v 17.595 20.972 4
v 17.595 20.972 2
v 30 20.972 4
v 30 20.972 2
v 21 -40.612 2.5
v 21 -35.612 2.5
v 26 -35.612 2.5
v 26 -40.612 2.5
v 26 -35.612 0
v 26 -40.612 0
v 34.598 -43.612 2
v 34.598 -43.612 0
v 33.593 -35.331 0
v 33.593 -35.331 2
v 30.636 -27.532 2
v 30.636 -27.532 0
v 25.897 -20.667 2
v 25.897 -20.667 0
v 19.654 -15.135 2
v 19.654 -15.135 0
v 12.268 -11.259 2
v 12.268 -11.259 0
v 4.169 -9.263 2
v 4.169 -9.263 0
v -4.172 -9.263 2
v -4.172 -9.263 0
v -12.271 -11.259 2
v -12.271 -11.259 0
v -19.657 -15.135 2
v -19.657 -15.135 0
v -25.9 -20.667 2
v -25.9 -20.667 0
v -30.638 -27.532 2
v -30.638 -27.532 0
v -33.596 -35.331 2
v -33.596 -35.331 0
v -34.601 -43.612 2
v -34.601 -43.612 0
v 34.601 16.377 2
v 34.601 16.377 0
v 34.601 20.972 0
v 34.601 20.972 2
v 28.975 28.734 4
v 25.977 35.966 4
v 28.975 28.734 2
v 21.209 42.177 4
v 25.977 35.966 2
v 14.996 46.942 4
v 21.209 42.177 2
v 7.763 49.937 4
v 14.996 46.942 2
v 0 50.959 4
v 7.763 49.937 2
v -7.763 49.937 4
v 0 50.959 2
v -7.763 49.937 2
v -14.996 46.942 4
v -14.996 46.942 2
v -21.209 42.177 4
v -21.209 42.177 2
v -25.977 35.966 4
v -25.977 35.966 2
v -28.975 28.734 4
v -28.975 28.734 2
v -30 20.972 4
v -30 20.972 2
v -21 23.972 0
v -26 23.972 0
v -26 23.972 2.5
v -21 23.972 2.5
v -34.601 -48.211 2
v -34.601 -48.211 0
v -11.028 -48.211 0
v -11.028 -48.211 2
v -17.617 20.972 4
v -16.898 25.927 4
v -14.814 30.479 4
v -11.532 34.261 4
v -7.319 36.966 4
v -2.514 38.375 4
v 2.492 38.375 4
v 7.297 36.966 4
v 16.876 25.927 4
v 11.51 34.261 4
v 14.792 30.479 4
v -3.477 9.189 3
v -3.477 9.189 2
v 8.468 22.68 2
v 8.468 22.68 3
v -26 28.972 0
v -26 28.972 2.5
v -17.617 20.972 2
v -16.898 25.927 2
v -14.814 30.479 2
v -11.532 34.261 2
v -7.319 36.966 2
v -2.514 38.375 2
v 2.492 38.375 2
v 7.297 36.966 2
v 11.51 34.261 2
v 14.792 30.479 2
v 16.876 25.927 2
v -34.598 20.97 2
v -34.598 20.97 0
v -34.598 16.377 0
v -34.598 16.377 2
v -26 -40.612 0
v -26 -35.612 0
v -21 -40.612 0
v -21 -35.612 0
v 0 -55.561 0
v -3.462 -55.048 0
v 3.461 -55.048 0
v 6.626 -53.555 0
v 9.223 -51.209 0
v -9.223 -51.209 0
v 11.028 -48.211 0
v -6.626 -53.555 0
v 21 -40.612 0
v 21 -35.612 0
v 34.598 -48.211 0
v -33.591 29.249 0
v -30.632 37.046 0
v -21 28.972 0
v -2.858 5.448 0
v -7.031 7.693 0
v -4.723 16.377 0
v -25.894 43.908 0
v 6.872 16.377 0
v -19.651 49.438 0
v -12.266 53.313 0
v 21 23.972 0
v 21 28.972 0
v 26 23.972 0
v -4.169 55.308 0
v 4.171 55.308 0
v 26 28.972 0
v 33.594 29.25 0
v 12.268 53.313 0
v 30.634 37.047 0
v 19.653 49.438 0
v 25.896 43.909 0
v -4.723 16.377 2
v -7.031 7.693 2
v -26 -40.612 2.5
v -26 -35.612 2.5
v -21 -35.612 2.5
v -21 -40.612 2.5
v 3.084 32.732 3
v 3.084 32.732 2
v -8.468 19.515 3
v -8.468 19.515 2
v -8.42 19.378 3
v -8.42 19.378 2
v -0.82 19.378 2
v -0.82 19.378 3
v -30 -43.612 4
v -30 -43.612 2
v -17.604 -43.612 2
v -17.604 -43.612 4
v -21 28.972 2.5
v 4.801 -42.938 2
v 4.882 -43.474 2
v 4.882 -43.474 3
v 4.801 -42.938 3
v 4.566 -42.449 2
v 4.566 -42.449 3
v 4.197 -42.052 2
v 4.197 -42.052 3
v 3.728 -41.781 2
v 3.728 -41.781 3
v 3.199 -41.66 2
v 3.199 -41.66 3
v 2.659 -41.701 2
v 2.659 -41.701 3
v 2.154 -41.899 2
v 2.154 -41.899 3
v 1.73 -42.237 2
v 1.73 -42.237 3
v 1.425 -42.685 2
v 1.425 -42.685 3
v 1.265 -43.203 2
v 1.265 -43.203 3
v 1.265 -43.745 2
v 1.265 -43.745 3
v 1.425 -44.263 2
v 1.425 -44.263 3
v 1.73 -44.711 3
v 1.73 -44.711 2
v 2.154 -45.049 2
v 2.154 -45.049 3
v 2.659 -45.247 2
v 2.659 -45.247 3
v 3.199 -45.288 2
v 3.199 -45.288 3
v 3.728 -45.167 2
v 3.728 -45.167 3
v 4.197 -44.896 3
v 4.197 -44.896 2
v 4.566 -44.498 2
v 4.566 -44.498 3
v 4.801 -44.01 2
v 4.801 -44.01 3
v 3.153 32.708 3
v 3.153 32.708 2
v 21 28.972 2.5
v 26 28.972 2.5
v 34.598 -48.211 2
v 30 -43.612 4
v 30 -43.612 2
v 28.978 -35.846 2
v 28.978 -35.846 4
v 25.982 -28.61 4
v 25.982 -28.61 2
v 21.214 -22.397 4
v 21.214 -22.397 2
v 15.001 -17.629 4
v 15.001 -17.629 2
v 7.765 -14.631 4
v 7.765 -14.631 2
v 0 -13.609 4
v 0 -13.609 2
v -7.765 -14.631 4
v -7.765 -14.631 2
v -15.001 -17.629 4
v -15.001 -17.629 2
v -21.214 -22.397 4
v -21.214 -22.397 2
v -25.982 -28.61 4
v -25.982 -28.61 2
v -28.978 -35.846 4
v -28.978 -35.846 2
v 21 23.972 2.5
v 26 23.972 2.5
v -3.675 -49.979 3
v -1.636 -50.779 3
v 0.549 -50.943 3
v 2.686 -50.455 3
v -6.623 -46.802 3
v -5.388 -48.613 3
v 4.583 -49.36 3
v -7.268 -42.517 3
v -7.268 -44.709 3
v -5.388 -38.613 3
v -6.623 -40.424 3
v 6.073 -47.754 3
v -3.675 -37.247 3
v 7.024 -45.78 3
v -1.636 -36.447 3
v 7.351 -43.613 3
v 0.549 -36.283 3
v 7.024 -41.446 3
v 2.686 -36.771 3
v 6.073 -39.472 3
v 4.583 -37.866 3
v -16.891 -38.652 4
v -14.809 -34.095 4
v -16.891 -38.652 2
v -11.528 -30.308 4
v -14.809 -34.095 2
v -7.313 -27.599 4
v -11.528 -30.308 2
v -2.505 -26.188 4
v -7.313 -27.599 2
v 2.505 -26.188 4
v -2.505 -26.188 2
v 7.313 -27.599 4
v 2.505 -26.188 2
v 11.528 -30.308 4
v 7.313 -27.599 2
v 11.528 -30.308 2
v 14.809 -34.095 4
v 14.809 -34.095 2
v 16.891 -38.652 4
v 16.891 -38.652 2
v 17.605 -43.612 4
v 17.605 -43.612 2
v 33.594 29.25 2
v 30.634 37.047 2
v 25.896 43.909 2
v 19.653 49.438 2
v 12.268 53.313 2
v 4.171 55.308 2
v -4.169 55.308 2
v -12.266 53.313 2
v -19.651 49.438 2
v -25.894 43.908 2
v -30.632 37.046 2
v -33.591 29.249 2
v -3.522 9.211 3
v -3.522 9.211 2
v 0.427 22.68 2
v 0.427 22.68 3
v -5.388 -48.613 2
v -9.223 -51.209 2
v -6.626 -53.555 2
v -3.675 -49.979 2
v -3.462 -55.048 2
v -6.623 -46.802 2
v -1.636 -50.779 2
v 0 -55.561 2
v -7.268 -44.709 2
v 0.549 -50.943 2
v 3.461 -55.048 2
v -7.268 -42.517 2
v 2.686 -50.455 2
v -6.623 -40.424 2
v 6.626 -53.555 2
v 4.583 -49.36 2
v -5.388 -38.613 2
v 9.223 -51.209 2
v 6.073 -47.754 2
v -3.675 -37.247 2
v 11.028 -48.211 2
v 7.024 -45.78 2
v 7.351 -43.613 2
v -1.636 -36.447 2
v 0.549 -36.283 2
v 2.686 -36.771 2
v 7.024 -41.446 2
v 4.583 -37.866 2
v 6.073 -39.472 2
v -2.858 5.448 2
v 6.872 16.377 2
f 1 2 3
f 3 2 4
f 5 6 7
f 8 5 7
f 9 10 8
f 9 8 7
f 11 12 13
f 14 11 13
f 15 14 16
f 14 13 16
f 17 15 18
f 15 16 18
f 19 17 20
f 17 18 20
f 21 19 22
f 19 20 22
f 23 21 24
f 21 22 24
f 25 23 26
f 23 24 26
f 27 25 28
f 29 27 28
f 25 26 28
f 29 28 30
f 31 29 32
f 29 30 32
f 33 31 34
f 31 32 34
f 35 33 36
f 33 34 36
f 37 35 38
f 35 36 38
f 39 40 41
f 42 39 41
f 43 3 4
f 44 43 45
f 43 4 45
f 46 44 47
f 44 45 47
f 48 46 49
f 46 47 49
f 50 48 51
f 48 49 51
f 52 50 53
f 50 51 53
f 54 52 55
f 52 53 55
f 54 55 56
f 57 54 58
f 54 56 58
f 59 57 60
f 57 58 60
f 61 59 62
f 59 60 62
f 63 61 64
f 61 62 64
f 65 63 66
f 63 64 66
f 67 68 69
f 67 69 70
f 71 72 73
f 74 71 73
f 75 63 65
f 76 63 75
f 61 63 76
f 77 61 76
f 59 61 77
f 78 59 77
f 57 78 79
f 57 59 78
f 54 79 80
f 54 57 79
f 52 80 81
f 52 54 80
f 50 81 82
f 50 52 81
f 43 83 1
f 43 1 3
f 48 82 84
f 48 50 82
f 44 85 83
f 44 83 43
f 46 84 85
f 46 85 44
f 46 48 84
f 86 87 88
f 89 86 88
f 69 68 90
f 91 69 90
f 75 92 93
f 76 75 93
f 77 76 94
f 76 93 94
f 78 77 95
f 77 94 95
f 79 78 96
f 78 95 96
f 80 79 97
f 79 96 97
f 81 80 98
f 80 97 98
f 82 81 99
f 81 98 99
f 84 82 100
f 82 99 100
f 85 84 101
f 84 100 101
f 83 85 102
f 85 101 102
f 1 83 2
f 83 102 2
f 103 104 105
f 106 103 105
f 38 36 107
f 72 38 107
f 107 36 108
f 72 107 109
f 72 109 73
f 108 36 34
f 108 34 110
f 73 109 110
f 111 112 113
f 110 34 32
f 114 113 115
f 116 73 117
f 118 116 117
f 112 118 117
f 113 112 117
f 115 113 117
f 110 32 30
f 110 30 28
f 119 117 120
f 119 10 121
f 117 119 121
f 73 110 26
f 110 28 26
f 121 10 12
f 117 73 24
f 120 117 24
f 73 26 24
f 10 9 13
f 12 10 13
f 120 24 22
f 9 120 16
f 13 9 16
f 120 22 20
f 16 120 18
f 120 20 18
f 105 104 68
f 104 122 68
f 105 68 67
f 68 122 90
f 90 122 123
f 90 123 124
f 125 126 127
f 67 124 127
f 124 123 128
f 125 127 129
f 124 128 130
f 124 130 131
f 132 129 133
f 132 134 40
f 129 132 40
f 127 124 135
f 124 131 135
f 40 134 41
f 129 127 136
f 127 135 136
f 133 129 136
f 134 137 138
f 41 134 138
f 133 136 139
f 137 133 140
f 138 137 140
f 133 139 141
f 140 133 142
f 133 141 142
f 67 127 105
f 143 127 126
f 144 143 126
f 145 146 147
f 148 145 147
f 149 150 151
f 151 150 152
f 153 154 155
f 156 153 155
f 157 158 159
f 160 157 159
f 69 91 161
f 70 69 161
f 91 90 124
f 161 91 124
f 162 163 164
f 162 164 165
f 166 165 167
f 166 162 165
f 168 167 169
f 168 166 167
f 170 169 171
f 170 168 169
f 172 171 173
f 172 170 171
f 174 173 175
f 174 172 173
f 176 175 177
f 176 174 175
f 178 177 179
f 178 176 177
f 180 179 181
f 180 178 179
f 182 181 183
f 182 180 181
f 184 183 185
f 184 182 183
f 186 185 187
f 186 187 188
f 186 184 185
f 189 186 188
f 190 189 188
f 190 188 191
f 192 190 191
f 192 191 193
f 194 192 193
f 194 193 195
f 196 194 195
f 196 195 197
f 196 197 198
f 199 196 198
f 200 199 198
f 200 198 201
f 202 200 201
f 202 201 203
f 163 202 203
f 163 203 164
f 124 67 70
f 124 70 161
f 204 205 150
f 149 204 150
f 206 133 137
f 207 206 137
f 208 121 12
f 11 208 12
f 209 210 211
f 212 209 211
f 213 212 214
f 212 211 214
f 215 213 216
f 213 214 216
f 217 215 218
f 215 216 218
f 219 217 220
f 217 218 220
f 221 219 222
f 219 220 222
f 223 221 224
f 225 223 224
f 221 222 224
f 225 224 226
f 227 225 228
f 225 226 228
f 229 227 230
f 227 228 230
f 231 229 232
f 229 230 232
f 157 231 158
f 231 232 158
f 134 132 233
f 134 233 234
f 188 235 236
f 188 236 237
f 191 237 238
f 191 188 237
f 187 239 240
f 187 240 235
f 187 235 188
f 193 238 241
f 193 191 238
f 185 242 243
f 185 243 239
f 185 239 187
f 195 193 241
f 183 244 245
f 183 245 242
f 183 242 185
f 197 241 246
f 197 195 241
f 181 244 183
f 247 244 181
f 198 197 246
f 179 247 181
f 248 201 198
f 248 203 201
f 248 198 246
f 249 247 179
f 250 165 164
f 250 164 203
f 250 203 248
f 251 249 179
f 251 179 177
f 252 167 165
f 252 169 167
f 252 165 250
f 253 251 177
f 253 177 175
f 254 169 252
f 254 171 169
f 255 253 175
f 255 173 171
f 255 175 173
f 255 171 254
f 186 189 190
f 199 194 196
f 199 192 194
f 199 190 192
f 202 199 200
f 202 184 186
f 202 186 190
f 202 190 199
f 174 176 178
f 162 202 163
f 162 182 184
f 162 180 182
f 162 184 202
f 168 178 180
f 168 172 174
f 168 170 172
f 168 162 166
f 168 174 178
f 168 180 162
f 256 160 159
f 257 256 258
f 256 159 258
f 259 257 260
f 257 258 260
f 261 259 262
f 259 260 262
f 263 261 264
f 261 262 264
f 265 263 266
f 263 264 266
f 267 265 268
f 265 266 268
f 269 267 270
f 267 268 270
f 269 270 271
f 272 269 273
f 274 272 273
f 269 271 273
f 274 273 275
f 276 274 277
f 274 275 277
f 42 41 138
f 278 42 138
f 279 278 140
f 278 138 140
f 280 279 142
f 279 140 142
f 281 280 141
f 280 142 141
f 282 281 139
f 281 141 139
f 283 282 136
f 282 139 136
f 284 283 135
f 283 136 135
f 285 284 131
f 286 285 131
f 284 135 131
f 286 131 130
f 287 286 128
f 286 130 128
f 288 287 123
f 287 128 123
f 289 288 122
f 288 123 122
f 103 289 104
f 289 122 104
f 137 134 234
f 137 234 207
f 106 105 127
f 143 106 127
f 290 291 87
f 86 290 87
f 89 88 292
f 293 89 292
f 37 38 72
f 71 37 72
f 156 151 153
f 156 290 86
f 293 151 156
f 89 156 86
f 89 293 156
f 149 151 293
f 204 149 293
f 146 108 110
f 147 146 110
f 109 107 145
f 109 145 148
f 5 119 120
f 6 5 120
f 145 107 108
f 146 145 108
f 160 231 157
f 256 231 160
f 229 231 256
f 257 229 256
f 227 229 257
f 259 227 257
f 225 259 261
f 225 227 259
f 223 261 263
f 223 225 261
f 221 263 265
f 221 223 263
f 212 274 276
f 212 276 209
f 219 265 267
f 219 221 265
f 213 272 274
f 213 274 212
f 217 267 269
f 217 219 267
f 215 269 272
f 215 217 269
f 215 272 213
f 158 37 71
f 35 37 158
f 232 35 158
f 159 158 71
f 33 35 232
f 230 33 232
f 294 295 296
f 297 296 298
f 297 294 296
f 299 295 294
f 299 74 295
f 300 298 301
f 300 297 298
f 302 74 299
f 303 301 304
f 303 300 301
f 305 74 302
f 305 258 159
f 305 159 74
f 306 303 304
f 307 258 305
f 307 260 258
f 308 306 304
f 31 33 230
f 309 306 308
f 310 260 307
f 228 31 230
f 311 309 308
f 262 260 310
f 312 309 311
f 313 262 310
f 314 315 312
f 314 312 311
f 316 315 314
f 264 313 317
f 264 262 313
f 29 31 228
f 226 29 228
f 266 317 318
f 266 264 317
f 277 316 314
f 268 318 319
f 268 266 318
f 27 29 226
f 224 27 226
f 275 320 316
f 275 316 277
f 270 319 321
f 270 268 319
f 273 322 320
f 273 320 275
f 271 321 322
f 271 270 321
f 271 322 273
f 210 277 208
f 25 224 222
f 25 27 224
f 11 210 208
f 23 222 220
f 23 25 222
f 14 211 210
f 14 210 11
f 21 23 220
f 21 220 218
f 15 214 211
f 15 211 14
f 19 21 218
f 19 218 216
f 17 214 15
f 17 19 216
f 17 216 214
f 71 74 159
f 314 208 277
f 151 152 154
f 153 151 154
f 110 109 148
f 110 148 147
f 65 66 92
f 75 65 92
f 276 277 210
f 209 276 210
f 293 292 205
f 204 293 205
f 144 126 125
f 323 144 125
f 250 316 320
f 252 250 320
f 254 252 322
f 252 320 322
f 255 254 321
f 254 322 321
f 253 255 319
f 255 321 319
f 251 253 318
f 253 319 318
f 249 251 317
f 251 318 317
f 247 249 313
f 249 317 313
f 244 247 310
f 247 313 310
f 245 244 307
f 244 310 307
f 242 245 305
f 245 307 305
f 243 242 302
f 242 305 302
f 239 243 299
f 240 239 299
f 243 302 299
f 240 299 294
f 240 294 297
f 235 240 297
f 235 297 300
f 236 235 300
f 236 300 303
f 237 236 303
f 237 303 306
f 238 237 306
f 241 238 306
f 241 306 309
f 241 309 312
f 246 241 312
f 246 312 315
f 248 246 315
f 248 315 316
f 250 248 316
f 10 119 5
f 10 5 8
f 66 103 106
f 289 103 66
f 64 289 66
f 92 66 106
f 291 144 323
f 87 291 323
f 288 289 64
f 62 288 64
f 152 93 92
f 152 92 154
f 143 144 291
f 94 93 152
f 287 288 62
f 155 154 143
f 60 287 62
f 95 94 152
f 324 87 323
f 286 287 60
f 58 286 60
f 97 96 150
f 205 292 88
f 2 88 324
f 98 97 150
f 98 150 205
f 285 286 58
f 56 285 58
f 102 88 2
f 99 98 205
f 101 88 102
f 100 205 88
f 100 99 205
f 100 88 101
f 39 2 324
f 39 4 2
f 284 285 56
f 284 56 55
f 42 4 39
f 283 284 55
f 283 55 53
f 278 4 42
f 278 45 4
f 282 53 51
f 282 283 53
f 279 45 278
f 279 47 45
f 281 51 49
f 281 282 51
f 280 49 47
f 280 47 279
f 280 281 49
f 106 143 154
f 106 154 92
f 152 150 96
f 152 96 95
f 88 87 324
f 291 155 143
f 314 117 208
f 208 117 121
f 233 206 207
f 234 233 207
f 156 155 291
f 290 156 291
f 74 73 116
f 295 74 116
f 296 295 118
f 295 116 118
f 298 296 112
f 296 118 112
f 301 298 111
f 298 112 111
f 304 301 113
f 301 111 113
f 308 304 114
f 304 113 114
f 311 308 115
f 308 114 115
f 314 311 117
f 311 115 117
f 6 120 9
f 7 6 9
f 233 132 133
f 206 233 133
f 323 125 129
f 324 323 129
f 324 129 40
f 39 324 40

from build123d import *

# Parameters (mm, degrees)
F3_DEPTH  = 2
F4_DEPTH  = 4
F5_DEPTH  = 3
F2_R      = 7.350556
F2_R_2    = 1.818894
F6_DEPTH  = 2
F7_DEPTH  = 4
F8_DEPTH  = 3
F9_W      = 5
F9_H      = 5
F10_DEPTH = 2.5


with BuildPart() as f3:
    # F1 (on Top) → F3 (new body)
    with BuildSketch(Plane.XY):
        with BuildLine():
            Line((-34.598458, 20.970316), (-34.598458, 16.37698))
            Line((-34.598458, 16.37698), (-4.722546, 16.37698))
            Line((-4.722546, 16.37698), (-7.030898, 7.69272))
            Line((-7.030898, 7.69272), (-2.858186, 5.448122))
            Line((-2.858186, 5.448122), (6.8723, 16.37698))
            Line((6.8723, 16.37698), (34.601226, 16.37698))
            Line((34.601226, 16.37698), (34.601226, 20.971586))
            ThreePointArc((34.601226, 20.971586), (0.000749, 55.560544), (-34.598458, 20.970316))
        make_face()
        Polygon((-8.41977, 19.378498), (-8.46803, 19.514896), (3.084144, 32.731786), (3.152978, 32.708164), (0.42705, 22.680498), (8.467928, 22.680498), (-3.47693, 9.189288), (-3.522396, 9.211386), (-0.82009, 19.378498), align=None, mode=Mode.SUBTRACT)
        with BuildLine():
            Line((-17.616881, 20.971586), (-29.99994, 20.971586))
            ThreePointArc((-29.99994, 20.971586), (3.8e-05, 50.959082), (30.000016, 20.971586))
            Line((30.000016, 20.971586), (17.59491, 20.971586))
            ThreePointArc((17.59491, 20.971586), (-0.010985, 38.553974), (-17.616881, 20.971586))
        make_face(mode=Mode.SUBTRACT)
        with BuildLine():
            ThreePointArc((30.000016, 20.971586), (3.8e-05, 50.959082), (-29.99994, 20.971586))
            Line((-29.99994, 20.971586), (-17.616881, 20.971586))
            ThreePointArc((-17.616881, 20.971586), (-0.010985, 38.553974), (17.59491, 20.971586))
            Line((17.59491, 20.971586), (30.000016, 20.971586))
        make_face()
    extrude(amount=F3_DEPTH)

    # F1 (on Top) → F4 (join)
    with BuildSketch(Plane.XY):
        with BuildLine():
            ThreePointArc((30.000016, 20.971586), (3.8e-05, 50.959082), (-29.99994, 20.971586))
            Line((-29.99994, 20.971586), (-17.616881, 20.971586))
            ThreePointArc((-17.616881, 20.971586), (-0.010985, 38.553974), (17.59491, 20.971586))
            Line((17.59491, 20.971586), (30.000016, 20.971586))
        make_face()
    extrude(amount=F4_DEPTH)

    # F1 (on Top) → F5 (join)
    with BuildSketch(Plane.XY):
        Polygon((3.084144, 32.731786), (-8.46803, 19.514896), (-8.41977, 19.378498), (-0.82009, 19.378498), (-3.522396, 9.211386), (-3.47693, 9.189288), (8.467928, 22.680498), (0.42705, 22.680498), (3.152978, 32.708164), align=None)
    extrude(amount=F5_DEPTH)


with BuildPart() as f6:
    # F2 (on Top) → F6 (new body)
    with BuildSketch(Plane.XY):
        with BuildLine():
            ThreePointArc((30.000016, -43.611546), (3.8e-05, -13.60899), (-29.99994, -43.611546))
            Line((-29.99994, -43.611546), (-17.604461, -43.611546))
            ThreePointArc((-17.604461, -43.611546), (5.1e-05, -26.008507), (17.604562, -43.611546))
            Line((17.604562, -43.611546), (30.000016, -43.611546))
        make_face()
        with BuildLine():
            Line((-34.601201, -48.211435), (-11.028477, -48.211435))
            ThreePointArc((-11.028477, -48.211435), (-0.000114, -55.560519), (11.028248, -48.211435))
            Line((11.028248, -48.211435), (34.598432, -48.211435))
            Line((34.598432, -48.211435), (34.598432, -43.611546))
            ThreePointArc((34.598432, -43.611546), (-0.001384, -9.01032), (-34.601201, -43.611546))
            Line((-34.601201, -43.611546), (-34.601201, -48.211435))
        make_face()
        with Locations((5.1e-05, -43.613019)):
            Circle(F2_R, mode=Mode.SUBTRACT)
        with BuildLine():
            Line((-17.604461, -43.611546), (-29.99994, -43.611546))
            ThreePointArc((-29.99994, -43.611546), (3.8e-05, -13.60899), (30.000016, -43.611546))
            Line((30.000016, -43.611546), (17.604562, -43.611546))
            ThreePointArc((17.604562, -43.611546), (5.1e-05, -26.008507), (-17.604461, -43.611546))
        make_face(mode=Mode.SUBTRACT)
        with Locations((5.1e-05, -43.613019)):
            Circle(F2_R)
        with Locations((3.063316, -43.47388)):
            Circle(F2_R_2, mode=Mode.SUBTRACT)
        with Locations((3.063316, -43.47388)):
            Circle(F2_R_2)
    extrude(amount=F6_DEPTH)

    # F2 (on Top) → F7 (join)
    with BuildSketch(Plane.XY):
        with BuildLine():
            ThreePointArc((30.000016, -43.611546), (3.8e-05, -13.60899), (-29.99994, -43.611546))
            Line((-29.99994, -43.611546), (-17.604461, -43.611546))
            ThreePointArc((-17.604461, -43.611546), (5.1e-05, -26.008507), (17.604562, -43.611546))
            Line((17.604562, -43.611546), (30.000016, -43.611546))
        make_face()
    extrude(amount=F7_DEPTH)

    # F2 (on Top) → F8 (join)
    with BuildSketch(Plane.XY):
        with Locations((5.1e-05, -43.613019)):
            Circle(F2_R)
        with Locations((3.063316, -43.47388)):
            Circle(F2_R_2, mode=Mode.SUBTRACT)
    extrude(amount=F8_DEPTH)


with BuildPart() as f10_tool:
    # F9 (on Top) → F10 (new body)
    with BuildSketch(Plane.XY):
        with Locations((-23.49994, -38.111546)):
            Rectangle(F9_W, F9_H)
        with Locations((23.49994, -38.111546)):
            Rectangle(F9_W, F9_H)
        with Locations((-23.49994, 26.471584)):
            Rectangle(F9_W, F9_H)
        with Locations((23.49994, 26.471584)):
            Rectangle(F9_W, F9_H)
    extrude(amount=F10_DEPTH)


with BuildPart() as f3_1:
    add(f3.part)

    # F10: cut by f10_tool
    add(f10_tool.part, mode=Mode.SUBTRACT)


with BuildPart() as f6_1:
    add(f6.part)

    # F10: cut by f10_tool
    add(f10_tool.part, mode=Mode.SUBTRACT)


solid = Compound([f3_1.part, f6_1.part])
